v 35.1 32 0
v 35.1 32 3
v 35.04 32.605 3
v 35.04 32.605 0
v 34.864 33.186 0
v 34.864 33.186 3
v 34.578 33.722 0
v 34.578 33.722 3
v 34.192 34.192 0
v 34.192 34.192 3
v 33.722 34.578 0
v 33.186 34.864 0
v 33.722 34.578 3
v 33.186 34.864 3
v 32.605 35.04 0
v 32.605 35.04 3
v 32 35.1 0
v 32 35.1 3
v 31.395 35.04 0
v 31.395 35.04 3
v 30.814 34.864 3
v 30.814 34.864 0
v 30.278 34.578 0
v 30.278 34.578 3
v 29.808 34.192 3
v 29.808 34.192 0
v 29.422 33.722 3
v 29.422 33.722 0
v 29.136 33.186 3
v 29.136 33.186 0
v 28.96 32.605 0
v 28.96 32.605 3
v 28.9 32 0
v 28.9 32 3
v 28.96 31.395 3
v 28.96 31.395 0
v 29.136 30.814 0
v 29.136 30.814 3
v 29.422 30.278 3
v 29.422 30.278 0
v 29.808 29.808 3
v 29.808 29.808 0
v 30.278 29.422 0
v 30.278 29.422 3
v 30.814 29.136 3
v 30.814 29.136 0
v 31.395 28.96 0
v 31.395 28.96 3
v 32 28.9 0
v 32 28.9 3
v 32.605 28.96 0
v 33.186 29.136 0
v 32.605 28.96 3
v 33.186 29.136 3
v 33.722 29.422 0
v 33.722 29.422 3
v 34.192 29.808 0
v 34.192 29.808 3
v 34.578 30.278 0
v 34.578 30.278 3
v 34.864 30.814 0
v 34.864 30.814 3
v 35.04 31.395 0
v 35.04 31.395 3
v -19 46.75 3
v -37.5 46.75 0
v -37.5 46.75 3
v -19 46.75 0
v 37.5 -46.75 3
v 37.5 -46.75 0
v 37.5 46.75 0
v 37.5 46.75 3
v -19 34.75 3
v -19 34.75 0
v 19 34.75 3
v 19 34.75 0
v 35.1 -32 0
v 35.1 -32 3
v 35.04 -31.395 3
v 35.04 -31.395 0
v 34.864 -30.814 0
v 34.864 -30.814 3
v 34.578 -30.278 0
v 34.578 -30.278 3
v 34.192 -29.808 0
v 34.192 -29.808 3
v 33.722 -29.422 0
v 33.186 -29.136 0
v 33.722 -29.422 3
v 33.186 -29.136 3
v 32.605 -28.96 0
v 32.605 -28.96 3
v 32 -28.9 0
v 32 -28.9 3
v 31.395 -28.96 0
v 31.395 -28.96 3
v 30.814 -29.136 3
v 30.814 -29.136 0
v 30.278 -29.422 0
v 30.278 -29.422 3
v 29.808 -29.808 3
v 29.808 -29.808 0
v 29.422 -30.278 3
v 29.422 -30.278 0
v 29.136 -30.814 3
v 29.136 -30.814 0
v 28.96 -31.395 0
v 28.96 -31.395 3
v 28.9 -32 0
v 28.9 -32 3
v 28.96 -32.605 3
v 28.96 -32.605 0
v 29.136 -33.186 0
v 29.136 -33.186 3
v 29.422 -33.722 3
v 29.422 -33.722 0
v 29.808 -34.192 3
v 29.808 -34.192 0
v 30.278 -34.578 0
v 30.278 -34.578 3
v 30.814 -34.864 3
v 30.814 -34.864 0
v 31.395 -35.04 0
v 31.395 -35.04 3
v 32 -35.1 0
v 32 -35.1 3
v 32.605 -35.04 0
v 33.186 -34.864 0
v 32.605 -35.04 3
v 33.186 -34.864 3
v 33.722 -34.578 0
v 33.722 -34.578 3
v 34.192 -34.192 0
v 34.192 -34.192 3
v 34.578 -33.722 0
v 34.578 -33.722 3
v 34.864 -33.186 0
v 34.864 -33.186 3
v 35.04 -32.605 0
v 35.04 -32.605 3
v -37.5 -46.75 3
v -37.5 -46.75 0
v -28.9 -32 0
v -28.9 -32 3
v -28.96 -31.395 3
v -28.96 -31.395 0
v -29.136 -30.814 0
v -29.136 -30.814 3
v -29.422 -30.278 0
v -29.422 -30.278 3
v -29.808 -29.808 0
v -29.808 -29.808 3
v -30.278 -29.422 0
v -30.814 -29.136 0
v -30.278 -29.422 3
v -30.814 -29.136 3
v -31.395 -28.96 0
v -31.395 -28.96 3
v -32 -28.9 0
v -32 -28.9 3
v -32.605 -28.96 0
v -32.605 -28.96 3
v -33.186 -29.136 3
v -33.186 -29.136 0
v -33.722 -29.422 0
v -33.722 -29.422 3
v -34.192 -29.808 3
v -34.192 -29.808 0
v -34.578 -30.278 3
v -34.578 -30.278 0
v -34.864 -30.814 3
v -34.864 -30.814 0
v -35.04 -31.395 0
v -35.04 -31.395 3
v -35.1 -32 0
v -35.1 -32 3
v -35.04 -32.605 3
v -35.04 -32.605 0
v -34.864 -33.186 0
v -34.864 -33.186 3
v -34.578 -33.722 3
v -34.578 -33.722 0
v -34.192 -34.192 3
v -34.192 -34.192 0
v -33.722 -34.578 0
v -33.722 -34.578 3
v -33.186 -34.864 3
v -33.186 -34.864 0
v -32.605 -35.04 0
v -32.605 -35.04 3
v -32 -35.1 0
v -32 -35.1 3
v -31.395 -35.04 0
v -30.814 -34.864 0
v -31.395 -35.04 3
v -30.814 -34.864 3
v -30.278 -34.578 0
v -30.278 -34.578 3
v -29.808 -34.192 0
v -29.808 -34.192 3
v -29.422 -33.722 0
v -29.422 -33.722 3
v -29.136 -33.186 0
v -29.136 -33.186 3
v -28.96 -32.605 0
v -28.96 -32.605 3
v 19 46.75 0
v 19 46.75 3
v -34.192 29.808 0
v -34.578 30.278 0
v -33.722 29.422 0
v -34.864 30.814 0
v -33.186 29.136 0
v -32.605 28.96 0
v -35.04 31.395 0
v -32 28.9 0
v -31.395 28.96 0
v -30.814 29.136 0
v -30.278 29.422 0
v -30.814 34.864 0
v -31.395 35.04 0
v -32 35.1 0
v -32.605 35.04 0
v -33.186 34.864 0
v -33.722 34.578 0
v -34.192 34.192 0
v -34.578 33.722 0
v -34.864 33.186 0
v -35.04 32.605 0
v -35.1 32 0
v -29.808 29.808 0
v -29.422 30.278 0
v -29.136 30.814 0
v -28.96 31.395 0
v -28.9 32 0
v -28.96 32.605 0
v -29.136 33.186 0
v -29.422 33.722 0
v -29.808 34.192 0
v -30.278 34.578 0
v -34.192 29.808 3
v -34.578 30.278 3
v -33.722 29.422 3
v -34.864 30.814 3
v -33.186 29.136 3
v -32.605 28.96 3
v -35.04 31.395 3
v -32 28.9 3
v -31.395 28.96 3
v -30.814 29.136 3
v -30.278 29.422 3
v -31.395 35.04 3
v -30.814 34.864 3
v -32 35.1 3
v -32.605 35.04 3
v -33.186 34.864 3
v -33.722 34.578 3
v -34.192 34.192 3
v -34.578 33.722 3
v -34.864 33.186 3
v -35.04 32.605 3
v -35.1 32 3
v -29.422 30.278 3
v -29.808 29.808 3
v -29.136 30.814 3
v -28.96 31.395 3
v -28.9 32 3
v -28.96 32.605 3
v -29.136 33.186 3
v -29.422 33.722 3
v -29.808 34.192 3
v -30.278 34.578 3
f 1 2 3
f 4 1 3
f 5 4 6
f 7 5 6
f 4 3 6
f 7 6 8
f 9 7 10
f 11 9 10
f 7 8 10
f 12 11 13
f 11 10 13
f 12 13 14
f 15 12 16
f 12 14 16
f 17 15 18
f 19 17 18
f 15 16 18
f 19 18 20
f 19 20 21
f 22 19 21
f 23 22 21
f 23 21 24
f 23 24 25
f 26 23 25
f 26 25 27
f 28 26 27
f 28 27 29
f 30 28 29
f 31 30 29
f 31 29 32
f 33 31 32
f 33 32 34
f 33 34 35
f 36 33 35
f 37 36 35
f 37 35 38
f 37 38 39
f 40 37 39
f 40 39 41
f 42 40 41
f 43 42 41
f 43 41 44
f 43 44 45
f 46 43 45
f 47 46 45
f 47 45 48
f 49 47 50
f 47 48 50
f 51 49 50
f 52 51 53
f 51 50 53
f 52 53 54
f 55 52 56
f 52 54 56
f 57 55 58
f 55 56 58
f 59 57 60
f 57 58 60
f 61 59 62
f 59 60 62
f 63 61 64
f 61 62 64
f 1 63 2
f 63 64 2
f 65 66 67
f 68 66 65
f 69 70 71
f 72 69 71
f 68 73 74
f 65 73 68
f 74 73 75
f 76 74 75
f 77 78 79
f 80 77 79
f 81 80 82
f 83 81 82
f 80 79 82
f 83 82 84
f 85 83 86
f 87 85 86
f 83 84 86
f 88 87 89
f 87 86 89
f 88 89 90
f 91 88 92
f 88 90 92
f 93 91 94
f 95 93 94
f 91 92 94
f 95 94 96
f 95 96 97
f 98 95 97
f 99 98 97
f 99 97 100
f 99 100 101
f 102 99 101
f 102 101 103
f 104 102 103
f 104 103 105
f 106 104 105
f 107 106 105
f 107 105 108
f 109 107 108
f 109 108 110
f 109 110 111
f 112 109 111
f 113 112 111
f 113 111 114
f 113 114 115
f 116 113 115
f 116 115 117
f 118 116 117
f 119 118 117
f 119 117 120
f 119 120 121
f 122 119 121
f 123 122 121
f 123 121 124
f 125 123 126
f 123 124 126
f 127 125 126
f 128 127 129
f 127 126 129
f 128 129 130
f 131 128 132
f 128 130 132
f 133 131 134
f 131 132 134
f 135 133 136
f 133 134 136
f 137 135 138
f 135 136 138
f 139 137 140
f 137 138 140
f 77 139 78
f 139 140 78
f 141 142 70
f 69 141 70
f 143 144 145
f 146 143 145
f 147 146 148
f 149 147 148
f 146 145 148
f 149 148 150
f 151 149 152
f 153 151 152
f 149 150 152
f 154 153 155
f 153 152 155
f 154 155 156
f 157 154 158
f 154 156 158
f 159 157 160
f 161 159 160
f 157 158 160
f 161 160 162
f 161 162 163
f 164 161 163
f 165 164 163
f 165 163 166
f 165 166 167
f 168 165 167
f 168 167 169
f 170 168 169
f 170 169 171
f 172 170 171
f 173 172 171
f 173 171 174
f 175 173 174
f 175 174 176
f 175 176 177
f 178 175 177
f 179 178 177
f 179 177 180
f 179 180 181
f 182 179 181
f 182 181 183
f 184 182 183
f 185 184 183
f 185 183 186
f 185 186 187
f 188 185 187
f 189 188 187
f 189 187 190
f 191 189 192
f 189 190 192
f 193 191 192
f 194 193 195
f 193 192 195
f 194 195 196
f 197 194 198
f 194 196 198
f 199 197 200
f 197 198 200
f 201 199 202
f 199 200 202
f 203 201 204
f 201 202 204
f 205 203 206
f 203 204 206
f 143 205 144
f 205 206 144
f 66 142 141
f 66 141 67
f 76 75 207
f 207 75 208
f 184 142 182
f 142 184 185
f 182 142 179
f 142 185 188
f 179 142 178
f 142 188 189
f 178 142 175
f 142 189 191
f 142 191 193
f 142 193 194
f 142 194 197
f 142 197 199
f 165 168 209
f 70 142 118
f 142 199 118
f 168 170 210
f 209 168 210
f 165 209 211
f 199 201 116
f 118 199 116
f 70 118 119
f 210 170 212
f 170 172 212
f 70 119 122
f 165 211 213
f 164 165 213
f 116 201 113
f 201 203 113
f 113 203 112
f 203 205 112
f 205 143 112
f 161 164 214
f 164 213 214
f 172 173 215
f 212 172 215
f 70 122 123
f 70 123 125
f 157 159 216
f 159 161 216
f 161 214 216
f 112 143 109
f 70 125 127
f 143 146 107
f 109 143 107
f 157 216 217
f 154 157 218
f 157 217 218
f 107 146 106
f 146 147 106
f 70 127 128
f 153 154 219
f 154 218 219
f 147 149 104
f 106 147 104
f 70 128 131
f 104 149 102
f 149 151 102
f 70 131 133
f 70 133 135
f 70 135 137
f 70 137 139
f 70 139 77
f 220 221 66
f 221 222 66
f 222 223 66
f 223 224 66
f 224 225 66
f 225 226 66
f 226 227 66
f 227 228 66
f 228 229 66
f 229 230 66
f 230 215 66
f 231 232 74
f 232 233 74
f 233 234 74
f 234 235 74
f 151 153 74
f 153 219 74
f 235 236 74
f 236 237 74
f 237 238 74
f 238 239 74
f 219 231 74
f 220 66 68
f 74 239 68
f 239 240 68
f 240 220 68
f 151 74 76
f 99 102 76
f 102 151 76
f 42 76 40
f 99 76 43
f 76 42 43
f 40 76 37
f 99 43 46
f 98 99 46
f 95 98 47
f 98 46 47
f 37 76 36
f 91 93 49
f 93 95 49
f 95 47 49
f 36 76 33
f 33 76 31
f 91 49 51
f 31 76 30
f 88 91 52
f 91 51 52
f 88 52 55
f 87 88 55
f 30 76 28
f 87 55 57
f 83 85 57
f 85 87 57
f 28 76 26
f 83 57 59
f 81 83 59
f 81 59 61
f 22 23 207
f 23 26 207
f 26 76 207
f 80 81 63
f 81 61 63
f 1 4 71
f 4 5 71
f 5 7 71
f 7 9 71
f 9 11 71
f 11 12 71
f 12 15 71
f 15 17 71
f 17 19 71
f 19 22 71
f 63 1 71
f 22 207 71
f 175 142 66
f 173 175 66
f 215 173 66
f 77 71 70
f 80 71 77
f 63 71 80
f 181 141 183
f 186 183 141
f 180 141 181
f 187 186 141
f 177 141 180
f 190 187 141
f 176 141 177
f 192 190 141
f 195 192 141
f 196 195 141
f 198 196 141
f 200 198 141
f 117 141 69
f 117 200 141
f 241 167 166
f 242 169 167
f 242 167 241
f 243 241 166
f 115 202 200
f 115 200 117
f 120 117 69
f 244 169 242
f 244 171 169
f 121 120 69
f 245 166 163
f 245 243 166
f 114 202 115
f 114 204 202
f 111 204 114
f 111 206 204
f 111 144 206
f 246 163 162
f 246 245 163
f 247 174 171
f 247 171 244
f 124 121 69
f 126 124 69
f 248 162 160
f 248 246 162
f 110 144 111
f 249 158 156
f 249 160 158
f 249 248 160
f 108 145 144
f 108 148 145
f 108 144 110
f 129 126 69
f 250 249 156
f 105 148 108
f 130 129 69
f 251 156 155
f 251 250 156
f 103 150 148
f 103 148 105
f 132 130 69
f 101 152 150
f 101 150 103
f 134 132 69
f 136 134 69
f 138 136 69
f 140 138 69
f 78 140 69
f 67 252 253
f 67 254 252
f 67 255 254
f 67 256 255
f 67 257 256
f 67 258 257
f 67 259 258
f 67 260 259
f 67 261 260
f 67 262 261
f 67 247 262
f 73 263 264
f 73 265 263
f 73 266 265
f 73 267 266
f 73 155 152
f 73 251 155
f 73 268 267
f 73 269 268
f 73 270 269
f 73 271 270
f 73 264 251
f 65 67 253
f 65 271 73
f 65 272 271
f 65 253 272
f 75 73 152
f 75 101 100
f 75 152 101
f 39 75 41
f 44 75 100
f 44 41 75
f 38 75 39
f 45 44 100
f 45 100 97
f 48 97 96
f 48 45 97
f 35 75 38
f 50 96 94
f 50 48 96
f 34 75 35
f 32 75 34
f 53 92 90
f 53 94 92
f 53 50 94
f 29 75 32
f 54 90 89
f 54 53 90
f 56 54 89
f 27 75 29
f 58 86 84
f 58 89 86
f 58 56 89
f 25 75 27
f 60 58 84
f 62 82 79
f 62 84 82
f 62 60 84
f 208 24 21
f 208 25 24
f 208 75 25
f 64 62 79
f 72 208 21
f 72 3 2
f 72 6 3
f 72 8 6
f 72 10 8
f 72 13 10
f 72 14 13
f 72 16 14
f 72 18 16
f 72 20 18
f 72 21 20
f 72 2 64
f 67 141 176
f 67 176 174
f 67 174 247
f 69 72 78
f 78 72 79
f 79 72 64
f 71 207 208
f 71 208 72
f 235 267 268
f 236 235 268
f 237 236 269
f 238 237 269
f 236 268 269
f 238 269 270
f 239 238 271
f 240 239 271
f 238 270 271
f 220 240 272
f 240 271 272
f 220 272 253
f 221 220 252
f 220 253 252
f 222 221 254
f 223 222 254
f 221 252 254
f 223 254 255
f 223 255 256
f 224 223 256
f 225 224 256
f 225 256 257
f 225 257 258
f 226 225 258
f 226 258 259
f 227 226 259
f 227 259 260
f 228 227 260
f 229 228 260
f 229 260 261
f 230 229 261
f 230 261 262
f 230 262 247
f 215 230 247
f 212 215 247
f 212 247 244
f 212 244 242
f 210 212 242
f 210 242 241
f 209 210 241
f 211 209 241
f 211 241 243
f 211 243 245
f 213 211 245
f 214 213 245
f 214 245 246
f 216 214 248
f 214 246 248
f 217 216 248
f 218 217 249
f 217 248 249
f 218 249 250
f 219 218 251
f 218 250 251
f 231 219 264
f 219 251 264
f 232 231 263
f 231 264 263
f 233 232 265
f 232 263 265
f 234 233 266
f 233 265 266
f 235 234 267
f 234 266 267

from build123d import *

# Parameters (mm, degrees)
SKETCH1_W            = 75
SKETCH1_H            = 93.5
BOSS_EXTRUDE1_DEPTH  = 3
SKETCH2_R            = 3.1
CUT_EXTRUDE1_DEPTH   = 61.006770451
LPATTERN1_COUNT      = 2
LPATTERN1_PITCH      = 64
LPATTERN1_COUNT_DIR2 = 2
LPATTERN1_PITCH_DIR2 = 64
SKETCH3_W            = 38
SKETCH3_H            = 12
CUT_EXTRUDE2_DEPTH   = 61.006770451


with BuildPart() as part:
    # Sketch1 → Boss-Extrude1 (new body)
    with BuildSketch(Plane.XY):
        Rectangle(SKETCH1_W, SKETCH1_H)
    extrude(amount=BOSS_EXTRUDE1_DEPTH)

    # Sketch2 → Cut-Extrude1 (cut, through all)
    with BuildSketch(Plane.XY.offset(3)):
        with Locations((-32, 32)):
            Circle(SKETCH2_R)
    cut_extrude1 = extrude(amount=-CUT_EXTRUDE1_DEPTH, mode=Mode.SUBTRACT)

    # LPattern1: Cut-Extrude1 2 × 2
    with Locations(*[(i * LPATTERN1_PITCH, -j * LPATTERN1_PITCH_DIR2, 0) for i in range(LPATTERN1_COUNT) for j in range(LPATTERN1_COUNT_DIR2) if (i, j) != (0, 0)]):
        add(cut_extrude1, mode=Mode.SUBTRACT)

    # Sketch3 → Cut-Extrude2 (cut, through all)
    with BuildSketch(Plane.XY.offset(3)):
        with Locations((0, 40.75)):
            Rectangle(SKETCH3_W, SKETCH3_H)
    extrude(amount=-CUT_EXTRUDE2_DEPTH, mode=Mode.SUBTRACT)


solid = part.part
